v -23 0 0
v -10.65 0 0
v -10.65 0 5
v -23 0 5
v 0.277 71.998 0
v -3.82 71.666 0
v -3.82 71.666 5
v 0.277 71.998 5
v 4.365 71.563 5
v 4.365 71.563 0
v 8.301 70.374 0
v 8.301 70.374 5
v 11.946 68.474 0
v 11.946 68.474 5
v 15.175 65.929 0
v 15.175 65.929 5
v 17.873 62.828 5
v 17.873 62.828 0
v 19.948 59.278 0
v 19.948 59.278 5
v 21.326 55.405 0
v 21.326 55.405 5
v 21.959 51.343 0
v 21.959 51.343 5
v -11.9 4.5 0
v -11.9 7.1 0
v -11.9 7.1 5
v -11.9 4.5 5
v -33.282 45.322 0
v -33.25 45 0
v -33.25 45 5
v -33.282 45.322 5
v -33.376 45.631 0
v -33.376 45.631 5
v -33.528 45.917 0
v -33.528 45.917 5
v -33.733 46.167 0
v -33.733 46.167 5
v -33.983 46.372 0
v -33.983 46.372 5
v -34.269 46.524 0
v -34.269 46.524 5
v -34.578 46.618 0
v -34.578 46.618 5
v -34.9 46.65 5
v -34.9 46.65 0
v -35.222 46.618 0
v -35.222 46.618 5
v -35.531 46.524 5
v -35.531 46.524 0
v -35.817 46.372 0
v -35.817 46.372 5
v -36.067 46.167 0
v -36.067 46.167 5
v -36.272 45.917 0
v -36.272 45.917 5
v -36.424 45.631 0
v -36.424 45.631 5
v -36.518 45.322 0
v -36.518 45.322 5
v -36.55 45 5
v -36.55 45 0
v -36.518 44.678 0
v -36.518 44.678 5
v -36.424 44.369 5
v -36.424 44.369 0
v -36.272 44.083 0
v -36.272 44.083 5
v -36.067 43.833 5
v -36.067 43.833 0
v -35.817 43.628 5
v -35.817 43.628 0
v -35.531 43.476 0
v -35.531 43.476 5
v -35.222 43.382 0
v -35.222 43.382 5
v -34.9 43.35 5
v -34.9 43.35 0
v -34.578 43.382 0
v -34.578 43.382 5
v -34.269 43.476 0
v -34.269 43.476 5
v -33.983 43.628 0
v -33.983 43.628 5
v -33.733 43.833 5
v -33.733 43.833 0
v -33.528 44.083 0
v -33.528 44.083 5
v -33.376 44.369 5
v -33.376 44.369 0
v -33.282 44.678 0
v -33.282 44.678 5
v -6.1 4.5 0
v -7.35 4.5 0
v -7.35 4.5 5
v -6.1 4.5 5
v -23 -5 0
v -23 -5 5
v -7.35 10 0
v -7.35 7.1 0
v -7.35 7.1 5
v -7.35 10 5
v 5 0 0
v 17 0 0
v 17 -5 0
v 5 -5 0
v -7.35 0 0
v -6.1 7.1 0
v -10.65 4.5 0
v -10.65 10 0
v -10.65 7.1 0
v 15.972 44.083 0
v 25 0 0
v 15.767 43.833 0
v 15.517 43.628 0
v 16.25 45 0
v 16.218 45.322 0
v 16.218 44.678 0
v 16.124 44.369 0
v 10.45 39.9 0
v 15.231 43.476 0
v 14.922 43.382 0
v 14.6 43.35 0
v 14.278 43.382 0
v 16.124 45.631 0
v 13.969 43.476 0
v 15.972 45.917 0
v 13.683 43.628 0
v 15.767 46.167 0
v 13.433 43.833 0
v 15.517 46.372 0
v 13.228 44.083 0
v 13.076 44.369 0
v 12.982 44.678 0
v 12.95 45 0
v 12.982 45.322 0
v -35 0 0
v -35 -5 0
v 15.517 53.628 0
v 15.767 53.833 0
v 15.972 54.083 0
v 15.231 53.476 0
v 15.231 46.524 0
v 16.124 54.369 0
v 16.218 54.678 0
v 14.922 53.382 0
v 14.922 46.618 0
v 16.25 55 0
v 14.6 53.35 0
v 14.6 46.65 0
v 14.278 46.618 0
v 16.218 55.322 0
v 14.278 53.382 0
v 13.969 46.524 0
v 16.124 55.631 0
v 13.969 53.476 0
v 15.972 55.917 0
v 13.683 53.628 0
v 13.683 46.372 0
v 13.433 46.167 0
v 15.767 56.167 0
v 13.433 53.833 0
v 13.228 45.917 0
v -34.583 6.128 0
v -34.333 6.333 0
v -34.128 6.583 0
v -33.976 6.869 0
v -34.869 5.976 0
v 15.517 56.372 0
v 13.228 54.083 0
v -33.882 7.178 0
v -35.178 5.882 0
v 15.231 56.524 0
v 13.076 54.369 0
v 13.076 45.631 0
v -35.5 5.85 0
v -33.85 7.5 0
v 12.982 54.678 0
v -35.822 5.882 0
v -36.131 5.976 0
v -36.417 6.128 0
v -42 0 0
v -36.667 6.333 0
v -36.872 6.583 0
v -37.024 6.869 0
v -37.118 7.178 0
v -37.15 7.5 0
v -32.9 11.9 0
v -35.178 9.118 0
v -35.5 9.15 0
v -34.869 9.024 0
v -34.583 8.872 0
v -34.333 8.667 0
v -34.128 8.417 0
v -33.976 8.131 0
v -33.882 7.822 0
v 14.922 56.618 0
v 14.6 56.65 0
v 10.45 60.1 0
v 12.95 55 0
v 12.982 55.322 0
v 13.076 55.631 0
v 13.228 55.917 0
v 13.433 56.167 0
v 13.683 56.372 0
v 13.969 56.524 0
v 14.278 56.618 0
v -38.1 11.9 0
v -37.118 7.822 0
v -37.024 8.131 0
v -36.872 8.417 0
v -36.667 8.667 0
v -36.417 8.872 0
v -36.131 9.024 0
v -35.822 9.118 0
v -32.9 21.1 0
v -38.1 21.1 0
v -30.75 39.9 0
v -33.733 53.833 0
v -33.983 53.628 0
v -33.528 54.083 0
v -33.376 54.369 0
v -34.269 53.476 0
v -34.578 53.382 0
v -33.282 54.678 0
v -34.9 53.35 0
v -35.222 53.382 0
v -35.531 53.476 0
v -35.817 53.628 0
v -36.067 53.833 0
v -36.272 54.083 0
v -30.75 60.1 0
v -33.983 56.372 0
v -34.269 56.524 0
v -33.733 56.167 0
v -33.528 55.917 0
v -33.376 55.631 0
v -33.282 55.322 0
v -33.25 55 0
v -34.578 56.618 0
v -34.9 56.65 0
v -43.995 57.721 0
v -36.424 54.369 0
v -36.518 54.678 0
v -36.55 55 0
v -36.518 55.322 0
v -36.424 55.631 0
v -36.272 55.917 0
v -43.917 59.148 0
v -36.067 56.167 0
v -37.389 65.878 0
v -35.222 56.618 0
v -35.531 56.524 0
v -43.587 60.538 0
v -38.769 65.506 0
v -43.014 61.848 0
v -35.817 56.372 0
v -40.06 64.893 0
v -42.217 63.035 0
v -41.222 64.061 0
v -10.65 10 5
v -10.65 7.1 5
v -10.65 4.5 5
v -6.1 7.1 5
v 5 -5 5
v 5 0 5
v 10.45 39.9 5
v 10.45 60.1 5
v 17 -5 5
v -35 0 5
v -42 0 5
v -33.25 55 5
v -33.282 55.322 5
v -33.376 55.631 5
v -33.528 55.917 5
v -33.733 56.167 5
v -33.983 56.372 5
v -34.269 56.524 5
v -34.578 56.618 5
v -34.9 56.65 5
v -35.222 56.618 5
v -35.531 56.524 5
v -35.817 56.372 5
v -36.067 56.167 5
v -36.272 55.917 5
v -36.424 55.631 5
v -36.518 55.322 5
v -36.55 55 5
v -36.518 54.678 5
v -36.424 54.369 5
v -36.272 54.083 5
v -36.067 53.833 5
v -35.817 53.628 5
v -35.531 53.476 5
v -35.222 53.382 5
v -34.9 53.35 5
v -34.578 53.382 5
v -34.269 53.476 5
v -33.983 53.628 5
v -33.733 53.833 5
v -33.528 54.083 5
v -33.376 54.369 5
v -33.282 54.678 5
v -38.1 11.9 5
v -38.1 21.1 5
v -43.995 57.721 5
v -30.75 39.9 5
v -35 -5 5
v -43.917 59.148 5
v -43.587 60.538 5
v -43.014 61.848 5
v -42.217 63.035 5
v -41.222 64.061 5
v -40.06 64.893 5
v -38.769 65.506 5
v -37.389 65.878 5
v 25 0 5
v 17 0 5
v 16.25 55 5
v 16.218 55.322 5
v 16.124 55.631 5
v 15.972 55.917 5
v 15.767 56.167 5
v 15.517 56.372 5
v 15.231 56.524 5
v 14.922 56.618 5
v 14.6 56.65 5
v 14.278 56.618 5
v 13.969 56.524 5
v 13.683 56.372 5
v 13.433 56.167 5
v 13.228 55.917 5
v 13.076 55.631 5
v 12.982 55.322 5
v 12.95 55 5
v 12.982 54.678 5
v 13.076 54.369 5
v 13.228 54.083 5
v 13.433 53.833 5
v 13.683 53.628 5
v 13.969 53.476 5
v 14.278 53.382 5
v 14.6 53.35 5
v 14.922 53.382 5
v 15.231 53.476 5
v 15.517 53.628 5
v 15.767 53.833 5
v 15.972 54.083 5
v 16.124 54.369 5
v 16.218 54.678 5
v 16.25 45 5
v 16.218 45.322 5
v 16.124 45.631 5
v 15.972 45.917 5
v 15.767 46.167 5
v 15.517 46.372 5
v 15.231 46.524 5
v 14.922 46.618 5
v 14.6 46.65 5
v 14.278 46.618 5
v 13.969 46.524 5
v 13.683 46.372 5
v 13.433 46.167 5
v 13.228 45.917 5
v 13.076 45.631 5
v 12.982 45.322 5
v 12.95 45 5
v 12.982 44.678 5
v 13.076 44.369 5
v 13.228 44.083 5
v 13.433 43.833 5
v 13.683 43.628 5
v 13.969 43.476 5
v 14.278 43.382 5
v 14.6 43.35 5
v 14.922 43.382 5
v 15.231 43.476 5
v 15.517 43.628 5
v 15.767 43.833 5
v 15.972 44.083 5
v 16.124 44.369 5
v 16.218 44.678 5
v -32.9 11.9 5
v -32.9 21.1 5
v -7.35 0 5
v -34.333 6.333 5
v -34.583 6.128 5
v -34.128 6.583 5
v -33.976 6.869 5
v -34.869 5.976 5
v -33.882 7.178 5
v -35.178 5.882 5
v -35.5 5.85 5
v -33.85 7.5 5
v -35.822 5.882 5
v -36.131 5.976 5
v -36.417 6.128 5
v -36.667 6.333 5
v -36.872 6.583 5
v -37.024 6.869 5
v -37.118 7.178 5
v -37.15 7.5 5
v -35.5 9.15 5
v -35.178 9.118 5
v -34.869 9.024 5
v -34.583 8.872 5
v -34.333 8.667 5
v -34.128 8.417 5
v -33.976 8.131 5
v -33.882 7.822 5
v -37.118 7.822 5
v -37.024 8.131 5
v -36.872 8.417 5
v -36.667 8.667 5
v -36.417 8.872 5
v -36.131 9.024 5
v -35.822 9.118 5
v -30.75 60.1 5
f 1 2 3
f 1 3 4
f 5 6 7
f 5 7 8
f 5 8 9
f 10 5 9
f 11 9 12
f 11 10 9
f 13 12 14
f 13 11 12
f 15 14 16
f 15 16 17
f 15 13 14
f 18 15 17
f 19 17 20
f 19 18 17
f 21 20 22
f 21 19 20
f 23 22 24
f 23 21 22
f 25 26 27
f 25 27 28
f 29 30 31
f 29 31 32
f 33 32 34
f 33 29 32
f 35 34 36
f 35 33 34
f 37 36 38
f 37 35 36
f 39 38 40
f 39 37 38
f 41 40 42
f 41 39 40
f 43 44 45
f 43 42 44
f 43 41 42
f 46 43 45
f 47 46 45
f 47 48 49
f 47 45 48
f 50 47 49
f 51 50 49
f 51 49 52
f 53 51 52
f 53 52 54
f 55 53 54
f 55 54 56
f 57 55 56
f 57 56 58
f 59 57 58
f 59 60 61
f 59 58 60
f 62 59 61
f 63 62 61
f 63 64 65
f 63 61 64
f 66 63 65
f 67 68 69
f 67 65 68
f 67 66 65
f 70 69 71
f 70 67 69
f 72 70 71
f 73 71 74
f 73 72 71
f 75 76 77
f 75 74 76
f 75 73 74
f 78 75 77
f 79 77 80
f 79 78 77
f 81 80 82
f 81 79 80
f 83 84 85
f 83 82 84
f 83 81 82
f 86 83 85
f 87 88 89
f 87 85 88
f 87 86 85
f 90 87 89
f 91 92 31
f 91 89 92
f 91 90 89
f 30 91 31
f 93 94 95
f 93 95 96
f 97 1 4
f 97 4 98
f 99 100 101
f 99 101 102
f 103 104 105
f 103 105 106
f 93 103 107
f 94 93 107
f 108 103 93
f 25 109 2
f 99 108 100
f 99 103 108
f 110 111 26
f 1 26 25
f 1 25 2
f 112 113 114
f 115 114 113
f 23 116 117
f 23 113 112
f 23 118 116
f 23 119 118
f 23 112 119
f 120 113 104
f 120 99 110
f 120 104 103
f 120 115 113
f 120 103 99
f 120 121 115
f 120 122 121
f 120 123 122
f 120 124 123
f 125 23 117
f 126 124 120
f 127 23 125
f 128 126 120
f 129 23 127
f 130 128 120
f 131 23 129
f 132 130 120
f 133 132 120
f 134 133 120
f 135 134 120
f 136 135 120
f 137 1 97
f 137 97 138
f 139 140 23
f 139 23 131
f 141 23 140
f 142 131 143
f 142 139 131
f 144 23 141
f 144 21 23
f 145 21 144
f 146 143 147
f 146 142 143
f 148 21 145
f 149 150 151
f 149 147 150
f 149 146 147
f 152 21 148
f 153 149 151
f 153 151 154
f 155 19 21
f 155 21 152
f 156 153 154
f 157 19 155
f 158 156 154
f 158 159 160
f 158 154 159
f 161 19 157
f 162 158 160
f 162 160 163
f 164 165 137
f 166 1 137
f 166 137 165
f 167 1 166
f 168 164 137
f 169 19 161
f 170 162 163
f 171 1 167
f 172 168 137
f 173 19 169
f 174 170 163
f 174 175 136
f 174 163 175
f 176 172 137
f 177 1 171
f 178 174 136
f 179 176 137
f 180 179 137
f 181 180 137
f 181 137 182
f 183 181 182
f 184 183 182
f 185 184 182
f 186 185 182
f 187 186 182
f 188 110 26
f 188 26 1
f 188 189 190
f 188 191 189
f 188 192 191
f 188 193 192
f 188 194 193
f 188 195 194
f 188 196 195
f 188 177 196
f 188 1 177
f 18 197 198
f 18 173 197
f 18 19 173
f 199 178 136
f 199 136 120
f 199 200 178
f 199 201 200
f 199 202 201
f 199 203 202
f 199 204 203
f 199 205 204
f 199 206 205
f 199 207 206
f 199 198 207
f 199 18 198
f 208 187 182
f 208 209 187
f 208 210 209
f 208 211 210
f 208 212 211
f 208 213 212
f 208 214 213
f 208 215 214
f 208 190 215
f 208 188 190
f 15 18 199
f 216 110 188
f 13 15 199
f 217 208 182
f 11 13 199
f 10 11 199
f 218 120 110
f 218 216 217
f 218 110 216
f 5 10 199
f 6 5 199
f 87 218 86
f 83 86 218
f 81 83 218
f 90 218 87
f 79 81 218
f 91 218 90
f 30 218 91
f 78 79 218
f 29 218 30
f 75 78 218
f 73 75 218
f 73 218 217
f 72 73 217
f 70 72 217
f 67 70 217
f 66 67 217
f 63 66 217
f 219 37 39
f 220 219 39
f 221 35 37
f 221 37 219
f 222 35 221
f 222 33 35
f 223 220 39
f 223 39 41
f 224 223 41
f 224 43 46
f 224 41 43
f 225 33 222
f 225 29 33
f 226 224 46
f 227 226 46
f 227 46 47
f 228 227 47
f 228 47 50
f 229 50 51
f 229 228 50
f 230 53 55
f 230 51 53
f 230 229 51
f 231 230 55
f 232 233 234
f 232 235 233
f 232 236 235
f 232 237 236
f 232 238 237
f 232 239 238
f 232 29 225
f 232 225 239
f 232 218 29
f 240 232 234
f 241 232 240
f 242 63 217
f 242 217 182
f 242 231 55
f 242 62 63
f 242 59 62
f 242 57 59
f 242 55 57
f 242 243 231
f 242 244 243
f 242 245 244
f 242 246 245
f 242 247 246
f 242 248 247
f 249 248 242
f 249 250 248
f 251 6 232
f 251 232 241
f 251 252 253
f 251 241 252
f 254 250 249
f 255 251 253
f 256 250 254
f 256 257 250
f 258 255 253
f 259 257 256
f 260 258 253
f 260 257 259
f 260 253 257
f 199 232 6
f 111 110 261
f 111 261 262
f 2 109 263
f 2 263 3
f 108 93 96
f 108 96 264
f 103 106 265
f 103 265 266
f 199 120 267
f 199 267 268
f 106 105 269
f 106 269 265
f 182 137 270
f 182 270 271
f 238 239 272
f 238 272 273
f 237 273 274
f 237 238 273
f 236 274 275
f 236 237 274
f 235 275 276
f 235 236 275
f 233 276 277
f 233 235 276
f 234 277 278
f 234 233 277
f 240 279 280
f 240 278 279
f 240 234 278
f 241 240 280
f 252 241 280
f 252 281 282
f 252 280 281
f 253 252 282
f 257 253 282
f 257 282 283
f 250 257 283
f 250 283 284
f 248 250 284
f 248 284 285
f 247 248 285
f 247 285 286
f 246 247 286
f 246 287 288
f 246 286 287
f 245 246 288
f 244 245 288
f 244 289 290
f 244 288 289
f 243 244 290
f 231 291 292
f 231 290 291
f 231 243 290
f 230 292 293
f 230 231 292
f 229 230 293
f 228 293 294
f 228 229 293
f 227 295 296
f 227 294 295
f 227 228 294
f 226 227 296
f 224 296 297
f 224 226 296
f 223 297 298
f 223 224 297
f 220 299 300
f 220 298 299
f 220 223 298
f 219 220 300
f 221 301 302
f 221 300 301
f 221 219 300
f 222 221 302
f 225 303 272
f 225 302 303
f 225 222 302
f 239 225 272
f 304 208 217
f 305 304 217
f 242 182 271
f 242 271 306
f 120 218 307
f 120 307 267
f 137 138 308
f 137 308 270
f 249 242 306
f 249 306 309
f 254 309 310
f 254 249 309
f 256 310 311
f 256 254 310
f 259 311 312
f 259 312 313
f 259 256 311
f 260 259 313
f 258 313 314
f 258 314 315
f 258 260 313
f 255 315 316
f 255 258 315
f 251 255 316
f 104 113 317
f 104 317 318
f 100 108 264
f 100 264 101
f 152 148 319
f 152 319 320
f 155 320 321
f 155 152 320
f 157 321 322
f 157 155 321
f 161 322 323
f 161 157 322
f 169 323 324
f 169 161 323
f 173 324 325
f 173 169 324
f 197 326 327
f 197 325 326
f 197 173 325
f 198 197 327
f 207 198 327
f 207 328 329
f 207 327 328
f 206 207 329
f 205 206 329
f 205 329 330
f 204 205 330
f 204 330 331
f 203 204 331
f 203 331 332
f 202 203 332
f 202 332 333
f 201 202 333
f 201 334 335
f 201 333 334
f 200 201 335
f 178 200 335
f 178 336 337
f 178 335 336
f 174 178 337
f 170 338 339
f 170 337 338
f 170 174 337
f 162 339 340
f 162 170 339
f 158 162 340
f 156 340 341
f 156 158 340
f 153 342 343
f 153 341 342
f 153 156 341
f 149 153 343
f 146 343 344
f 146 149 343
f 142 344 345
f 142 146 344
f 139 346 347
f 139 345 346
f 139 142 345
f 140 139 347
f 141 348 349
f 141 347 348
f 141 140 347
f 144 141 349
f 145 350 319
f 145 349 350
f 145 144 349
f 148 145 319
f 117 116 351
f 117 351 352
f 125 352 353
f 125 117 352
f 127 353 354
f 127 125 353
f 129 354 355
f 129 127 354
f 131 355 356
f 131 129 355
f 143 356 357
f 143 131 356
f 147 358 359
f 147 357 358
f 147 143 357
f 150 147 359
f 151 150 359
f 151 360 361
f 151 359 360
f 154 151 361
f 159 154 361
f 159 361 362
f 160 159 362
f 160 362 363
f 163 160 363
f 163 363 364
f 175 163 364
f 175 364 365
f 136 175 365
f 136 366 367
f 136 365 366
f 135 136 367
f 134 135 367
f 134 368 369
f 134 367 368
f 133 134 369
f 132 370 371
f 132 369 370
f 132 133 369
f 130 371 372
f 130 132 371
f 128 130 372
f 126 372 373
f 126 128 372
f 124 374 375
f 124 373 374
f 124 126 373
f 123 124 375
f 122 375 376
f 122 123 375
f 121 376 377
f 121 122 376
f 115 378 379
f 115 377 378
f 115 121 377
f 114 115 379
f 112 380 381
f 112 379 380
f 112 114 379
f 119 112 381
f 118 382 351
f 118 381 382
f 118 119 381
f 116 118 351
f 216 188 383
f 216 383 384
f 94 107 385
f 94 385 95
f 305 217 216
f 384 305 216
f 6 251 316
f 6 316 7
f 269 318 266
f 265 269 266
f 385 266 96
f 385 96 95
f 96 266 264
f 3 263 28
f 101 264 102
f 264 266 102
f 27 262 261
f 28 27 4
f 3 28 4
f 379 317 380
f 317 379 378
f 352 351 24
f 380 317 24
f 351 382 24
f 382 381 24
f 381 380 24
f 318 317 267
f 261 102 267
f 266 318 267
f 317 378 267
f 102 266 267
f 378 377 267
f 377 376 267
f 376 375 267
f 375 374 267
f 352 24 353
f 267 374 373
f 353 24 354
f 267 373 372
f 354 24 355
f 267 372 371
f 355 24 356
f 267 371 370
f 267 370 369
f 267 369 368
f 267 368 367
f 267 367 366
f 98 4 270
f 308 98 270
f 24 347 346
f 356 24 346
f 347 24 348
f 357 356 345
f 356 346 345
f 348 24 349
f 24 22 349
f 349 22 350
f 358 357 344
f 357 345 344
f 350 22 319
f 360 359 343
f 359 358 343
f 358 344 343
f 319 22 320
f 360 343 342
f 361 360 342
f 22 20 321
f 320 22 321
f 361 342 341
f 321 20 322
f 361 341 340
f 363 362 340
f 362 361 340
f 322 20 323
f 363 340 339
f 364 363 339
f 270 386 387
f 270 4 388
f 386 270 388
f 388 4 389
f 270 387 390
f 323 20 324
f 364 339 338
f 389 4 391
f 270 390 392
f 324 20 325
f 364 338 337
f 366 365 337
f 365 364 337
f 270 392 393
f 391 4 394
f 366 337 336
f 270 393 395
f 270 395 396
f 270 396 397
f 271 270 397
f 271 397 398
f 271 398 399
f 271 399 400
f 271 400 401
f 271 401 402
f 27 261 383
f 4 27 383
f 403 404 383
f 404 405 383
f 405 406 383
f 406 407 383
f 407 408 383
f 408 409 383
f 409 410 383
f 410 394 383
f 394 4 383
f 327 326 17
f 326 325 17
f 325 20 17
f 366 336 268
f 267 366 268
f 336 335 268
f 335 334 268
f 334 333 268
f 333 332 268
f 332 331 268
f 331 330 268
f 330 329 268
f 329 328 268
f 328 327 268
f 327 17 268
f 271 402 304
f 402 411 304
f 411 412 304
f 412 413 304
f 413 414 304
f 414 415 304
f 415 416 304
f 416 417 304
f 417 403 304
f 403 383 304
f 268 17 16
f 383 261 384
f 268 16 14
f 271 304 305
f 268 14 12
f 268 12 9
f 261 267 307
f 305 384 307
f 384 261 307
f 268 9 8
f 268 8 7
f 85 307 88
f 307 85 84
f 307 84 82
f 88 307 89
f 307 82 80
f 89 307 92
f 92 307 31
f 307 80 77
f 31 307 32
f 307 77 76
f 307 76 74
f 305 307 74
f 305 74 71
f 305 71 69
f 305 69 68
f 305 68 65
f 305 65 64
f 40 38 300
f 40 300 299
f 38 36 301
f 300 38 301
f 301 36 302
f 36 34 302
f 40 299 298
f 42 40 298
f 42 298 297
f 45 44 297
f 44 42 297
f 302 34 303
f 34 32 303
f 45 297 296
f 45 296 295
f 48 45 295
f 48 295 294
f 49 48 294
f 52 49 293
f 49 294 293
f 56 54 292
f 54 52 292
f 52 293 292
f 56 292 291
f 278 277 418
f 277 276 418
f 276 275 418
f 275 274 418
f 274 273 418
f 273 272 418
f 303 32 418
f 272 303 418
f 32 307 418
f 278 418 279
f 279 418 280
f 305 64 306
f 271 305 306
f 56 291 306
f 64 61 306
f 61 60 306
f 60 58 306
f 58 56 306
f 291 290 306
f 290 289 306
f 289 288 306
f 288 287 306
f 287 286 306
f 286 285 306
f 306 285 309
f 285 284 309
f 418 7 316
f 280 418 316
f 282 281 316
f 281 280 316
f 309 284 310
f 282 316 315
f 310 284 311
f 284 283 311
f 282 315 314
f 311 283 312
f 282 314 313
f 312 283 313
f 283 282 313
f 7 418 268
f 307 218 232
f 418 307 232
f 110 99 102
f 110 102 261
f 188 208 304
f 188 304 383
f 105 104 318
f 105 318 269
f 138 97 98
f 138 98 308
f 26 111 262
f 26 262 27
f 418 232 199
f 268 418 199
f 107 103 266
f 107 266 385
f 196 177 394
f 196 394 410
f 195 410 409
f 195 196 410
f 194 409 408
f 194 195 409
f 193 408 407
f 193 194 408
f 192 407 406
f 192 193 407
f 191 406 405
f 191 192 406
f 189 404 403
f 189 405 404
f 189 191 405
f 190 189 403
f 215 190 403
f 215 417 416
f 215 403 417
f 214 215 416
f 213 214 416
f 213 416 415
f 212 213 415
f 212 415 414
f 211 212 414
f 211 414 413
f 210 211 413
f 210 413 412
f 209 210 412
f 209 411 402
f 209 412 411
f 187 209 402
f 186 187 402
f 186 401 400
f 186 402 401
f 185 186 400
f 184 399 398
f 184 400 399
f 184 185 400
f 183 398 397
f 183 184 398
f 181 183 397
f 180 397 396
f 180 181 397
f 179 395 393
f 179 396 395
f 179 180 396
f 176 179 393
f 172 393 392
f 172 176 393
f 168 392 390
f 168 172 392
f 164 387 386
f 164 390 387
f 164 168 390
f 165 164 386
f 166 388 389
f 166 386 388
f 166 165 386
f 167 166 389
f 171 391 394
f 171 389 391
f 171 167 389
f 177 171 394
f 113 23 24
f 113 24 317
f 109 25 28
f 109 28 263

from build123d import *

# Parameters (mm, degrees)
ESKIZ_KONTUR_W        = 5.2
ESKIZ_KONTUR_H        = 9.2
ESKIZ_KONTUR_W_2      = 41.2
ESKIZ_KONTUR_H_2      = 20.2
PLASTINA_DEPTH        = 5
OTVERSTIYA_DEPTH      = 85.528105852
OTVERSTIYA_DEPTH_BACK = 85.528105852
ESKIZ_OTVERSTIYA_R    = 1.65


with BuildPart() as part:
    # Eskiz_kontur → Plastina (new body)
    with BuildSketch(Plane.XY):
        with BuildLine():
            Line((21.958964111, 51.343070401), (24.999994111, 4.01e-07))
            Line((24.999994111, 4.01e-07), (17, 4.01e-07))
            Line((17, 4.01e-07), (17, -5))
            Line((17, -5), (5, -5))
            Line((5, -5), (5, 0))
            Line((5, 0), (-7.35, 0))
            Line((-7.35, 0), (-7.35, 4.5))
            Line((-7.35, 4.5), (-6.1, 4.5))
            Line((-6.1, 4.5), (-6.1, 7.1))
            Line((-6.1, 7.1), (-7.35, 7.1))
            Line((-7.35, 7.1), (-7.35, 10))
            Line((-7.35, 10), (-10.65, 10))
            Line((-10.65, 10), (-10.65, 7.1))
            Line((-10.65, 7.1), (-11.9, 7.1))
            Line((-11.9, 7.1), (-11.9, 4.5))
            Line((-11.9, 4.5), (-10.65, 4.5))
            Line((-10.65, 4.5), (-10.65, 0))
            Line((-10.65, 0), (-23, 0))
            Line((-23, 0), (-23, -5))
            Line((-23, -5), (-35, -5))
            Line((-35, -5), (-35, 0))
            Line((-35, 0), (-42, 0))
            Line((-42, 0), (-43.99513, 57.7208))
            ThreePointArc((-43.99513, 57.7208), (-42.217170806, 63.034563621), (-37.389183787, 65.878463067))
            Line((-37.389183787, 65.878463067), (-3.820263787, 71.665773067))
            ThreePointArc((-3.820263787, 71.665773067), (13.620063981, 67.276975245), (21.958964111, 51.343070401))
        make_face()
        with Locations((-35.5, 16.5)):
            Rectangle(ESKIZ_KONTUR_W, ESKIZ_KONTUR_H, mode=Mode.SUBTRACT)
        with Locations((-10.15, 50)):
            Rectangle(ESKIZ_KONTUR_W_2, ESKIZ_KONTUR_H_2, mode=Mode.SUBTRACT)
    extrude(amount=PLASTINA_DEPTH)

    # Eskiz_otverstiya → Otverstiya (cut, two sides: drawn at the far end of the back side and taken through both)
    with BuildSketch(Plane.XY.offset(-OTVERSTIYA_DEPTH_BACK)):
        with Locations((-35.5, 7.5)):
            Circle(ESKIZ_OTVERSTIYA_R)
        with Locations((-34.9, 45)):
            Circle(ESKIZ_OTVERSTIYA_R)
        with Locations((-34.9, 55)):
            Circle(ESKIZ_OTVERSTIYA_R)
        with Locations((14.6, 45)):
            Circle(ESKIZ_OTVERSTIYA_R)
        with Locations((14.6, 55)):
            Circle(ESKIZ_OTVERSTIYA_R)
    extrude(amount=OTVERSTIYA_DEPTH + OTVERSTIYA_DEPTH_BACK, mode=Mode.SUBTRACT)


solid = part.part
